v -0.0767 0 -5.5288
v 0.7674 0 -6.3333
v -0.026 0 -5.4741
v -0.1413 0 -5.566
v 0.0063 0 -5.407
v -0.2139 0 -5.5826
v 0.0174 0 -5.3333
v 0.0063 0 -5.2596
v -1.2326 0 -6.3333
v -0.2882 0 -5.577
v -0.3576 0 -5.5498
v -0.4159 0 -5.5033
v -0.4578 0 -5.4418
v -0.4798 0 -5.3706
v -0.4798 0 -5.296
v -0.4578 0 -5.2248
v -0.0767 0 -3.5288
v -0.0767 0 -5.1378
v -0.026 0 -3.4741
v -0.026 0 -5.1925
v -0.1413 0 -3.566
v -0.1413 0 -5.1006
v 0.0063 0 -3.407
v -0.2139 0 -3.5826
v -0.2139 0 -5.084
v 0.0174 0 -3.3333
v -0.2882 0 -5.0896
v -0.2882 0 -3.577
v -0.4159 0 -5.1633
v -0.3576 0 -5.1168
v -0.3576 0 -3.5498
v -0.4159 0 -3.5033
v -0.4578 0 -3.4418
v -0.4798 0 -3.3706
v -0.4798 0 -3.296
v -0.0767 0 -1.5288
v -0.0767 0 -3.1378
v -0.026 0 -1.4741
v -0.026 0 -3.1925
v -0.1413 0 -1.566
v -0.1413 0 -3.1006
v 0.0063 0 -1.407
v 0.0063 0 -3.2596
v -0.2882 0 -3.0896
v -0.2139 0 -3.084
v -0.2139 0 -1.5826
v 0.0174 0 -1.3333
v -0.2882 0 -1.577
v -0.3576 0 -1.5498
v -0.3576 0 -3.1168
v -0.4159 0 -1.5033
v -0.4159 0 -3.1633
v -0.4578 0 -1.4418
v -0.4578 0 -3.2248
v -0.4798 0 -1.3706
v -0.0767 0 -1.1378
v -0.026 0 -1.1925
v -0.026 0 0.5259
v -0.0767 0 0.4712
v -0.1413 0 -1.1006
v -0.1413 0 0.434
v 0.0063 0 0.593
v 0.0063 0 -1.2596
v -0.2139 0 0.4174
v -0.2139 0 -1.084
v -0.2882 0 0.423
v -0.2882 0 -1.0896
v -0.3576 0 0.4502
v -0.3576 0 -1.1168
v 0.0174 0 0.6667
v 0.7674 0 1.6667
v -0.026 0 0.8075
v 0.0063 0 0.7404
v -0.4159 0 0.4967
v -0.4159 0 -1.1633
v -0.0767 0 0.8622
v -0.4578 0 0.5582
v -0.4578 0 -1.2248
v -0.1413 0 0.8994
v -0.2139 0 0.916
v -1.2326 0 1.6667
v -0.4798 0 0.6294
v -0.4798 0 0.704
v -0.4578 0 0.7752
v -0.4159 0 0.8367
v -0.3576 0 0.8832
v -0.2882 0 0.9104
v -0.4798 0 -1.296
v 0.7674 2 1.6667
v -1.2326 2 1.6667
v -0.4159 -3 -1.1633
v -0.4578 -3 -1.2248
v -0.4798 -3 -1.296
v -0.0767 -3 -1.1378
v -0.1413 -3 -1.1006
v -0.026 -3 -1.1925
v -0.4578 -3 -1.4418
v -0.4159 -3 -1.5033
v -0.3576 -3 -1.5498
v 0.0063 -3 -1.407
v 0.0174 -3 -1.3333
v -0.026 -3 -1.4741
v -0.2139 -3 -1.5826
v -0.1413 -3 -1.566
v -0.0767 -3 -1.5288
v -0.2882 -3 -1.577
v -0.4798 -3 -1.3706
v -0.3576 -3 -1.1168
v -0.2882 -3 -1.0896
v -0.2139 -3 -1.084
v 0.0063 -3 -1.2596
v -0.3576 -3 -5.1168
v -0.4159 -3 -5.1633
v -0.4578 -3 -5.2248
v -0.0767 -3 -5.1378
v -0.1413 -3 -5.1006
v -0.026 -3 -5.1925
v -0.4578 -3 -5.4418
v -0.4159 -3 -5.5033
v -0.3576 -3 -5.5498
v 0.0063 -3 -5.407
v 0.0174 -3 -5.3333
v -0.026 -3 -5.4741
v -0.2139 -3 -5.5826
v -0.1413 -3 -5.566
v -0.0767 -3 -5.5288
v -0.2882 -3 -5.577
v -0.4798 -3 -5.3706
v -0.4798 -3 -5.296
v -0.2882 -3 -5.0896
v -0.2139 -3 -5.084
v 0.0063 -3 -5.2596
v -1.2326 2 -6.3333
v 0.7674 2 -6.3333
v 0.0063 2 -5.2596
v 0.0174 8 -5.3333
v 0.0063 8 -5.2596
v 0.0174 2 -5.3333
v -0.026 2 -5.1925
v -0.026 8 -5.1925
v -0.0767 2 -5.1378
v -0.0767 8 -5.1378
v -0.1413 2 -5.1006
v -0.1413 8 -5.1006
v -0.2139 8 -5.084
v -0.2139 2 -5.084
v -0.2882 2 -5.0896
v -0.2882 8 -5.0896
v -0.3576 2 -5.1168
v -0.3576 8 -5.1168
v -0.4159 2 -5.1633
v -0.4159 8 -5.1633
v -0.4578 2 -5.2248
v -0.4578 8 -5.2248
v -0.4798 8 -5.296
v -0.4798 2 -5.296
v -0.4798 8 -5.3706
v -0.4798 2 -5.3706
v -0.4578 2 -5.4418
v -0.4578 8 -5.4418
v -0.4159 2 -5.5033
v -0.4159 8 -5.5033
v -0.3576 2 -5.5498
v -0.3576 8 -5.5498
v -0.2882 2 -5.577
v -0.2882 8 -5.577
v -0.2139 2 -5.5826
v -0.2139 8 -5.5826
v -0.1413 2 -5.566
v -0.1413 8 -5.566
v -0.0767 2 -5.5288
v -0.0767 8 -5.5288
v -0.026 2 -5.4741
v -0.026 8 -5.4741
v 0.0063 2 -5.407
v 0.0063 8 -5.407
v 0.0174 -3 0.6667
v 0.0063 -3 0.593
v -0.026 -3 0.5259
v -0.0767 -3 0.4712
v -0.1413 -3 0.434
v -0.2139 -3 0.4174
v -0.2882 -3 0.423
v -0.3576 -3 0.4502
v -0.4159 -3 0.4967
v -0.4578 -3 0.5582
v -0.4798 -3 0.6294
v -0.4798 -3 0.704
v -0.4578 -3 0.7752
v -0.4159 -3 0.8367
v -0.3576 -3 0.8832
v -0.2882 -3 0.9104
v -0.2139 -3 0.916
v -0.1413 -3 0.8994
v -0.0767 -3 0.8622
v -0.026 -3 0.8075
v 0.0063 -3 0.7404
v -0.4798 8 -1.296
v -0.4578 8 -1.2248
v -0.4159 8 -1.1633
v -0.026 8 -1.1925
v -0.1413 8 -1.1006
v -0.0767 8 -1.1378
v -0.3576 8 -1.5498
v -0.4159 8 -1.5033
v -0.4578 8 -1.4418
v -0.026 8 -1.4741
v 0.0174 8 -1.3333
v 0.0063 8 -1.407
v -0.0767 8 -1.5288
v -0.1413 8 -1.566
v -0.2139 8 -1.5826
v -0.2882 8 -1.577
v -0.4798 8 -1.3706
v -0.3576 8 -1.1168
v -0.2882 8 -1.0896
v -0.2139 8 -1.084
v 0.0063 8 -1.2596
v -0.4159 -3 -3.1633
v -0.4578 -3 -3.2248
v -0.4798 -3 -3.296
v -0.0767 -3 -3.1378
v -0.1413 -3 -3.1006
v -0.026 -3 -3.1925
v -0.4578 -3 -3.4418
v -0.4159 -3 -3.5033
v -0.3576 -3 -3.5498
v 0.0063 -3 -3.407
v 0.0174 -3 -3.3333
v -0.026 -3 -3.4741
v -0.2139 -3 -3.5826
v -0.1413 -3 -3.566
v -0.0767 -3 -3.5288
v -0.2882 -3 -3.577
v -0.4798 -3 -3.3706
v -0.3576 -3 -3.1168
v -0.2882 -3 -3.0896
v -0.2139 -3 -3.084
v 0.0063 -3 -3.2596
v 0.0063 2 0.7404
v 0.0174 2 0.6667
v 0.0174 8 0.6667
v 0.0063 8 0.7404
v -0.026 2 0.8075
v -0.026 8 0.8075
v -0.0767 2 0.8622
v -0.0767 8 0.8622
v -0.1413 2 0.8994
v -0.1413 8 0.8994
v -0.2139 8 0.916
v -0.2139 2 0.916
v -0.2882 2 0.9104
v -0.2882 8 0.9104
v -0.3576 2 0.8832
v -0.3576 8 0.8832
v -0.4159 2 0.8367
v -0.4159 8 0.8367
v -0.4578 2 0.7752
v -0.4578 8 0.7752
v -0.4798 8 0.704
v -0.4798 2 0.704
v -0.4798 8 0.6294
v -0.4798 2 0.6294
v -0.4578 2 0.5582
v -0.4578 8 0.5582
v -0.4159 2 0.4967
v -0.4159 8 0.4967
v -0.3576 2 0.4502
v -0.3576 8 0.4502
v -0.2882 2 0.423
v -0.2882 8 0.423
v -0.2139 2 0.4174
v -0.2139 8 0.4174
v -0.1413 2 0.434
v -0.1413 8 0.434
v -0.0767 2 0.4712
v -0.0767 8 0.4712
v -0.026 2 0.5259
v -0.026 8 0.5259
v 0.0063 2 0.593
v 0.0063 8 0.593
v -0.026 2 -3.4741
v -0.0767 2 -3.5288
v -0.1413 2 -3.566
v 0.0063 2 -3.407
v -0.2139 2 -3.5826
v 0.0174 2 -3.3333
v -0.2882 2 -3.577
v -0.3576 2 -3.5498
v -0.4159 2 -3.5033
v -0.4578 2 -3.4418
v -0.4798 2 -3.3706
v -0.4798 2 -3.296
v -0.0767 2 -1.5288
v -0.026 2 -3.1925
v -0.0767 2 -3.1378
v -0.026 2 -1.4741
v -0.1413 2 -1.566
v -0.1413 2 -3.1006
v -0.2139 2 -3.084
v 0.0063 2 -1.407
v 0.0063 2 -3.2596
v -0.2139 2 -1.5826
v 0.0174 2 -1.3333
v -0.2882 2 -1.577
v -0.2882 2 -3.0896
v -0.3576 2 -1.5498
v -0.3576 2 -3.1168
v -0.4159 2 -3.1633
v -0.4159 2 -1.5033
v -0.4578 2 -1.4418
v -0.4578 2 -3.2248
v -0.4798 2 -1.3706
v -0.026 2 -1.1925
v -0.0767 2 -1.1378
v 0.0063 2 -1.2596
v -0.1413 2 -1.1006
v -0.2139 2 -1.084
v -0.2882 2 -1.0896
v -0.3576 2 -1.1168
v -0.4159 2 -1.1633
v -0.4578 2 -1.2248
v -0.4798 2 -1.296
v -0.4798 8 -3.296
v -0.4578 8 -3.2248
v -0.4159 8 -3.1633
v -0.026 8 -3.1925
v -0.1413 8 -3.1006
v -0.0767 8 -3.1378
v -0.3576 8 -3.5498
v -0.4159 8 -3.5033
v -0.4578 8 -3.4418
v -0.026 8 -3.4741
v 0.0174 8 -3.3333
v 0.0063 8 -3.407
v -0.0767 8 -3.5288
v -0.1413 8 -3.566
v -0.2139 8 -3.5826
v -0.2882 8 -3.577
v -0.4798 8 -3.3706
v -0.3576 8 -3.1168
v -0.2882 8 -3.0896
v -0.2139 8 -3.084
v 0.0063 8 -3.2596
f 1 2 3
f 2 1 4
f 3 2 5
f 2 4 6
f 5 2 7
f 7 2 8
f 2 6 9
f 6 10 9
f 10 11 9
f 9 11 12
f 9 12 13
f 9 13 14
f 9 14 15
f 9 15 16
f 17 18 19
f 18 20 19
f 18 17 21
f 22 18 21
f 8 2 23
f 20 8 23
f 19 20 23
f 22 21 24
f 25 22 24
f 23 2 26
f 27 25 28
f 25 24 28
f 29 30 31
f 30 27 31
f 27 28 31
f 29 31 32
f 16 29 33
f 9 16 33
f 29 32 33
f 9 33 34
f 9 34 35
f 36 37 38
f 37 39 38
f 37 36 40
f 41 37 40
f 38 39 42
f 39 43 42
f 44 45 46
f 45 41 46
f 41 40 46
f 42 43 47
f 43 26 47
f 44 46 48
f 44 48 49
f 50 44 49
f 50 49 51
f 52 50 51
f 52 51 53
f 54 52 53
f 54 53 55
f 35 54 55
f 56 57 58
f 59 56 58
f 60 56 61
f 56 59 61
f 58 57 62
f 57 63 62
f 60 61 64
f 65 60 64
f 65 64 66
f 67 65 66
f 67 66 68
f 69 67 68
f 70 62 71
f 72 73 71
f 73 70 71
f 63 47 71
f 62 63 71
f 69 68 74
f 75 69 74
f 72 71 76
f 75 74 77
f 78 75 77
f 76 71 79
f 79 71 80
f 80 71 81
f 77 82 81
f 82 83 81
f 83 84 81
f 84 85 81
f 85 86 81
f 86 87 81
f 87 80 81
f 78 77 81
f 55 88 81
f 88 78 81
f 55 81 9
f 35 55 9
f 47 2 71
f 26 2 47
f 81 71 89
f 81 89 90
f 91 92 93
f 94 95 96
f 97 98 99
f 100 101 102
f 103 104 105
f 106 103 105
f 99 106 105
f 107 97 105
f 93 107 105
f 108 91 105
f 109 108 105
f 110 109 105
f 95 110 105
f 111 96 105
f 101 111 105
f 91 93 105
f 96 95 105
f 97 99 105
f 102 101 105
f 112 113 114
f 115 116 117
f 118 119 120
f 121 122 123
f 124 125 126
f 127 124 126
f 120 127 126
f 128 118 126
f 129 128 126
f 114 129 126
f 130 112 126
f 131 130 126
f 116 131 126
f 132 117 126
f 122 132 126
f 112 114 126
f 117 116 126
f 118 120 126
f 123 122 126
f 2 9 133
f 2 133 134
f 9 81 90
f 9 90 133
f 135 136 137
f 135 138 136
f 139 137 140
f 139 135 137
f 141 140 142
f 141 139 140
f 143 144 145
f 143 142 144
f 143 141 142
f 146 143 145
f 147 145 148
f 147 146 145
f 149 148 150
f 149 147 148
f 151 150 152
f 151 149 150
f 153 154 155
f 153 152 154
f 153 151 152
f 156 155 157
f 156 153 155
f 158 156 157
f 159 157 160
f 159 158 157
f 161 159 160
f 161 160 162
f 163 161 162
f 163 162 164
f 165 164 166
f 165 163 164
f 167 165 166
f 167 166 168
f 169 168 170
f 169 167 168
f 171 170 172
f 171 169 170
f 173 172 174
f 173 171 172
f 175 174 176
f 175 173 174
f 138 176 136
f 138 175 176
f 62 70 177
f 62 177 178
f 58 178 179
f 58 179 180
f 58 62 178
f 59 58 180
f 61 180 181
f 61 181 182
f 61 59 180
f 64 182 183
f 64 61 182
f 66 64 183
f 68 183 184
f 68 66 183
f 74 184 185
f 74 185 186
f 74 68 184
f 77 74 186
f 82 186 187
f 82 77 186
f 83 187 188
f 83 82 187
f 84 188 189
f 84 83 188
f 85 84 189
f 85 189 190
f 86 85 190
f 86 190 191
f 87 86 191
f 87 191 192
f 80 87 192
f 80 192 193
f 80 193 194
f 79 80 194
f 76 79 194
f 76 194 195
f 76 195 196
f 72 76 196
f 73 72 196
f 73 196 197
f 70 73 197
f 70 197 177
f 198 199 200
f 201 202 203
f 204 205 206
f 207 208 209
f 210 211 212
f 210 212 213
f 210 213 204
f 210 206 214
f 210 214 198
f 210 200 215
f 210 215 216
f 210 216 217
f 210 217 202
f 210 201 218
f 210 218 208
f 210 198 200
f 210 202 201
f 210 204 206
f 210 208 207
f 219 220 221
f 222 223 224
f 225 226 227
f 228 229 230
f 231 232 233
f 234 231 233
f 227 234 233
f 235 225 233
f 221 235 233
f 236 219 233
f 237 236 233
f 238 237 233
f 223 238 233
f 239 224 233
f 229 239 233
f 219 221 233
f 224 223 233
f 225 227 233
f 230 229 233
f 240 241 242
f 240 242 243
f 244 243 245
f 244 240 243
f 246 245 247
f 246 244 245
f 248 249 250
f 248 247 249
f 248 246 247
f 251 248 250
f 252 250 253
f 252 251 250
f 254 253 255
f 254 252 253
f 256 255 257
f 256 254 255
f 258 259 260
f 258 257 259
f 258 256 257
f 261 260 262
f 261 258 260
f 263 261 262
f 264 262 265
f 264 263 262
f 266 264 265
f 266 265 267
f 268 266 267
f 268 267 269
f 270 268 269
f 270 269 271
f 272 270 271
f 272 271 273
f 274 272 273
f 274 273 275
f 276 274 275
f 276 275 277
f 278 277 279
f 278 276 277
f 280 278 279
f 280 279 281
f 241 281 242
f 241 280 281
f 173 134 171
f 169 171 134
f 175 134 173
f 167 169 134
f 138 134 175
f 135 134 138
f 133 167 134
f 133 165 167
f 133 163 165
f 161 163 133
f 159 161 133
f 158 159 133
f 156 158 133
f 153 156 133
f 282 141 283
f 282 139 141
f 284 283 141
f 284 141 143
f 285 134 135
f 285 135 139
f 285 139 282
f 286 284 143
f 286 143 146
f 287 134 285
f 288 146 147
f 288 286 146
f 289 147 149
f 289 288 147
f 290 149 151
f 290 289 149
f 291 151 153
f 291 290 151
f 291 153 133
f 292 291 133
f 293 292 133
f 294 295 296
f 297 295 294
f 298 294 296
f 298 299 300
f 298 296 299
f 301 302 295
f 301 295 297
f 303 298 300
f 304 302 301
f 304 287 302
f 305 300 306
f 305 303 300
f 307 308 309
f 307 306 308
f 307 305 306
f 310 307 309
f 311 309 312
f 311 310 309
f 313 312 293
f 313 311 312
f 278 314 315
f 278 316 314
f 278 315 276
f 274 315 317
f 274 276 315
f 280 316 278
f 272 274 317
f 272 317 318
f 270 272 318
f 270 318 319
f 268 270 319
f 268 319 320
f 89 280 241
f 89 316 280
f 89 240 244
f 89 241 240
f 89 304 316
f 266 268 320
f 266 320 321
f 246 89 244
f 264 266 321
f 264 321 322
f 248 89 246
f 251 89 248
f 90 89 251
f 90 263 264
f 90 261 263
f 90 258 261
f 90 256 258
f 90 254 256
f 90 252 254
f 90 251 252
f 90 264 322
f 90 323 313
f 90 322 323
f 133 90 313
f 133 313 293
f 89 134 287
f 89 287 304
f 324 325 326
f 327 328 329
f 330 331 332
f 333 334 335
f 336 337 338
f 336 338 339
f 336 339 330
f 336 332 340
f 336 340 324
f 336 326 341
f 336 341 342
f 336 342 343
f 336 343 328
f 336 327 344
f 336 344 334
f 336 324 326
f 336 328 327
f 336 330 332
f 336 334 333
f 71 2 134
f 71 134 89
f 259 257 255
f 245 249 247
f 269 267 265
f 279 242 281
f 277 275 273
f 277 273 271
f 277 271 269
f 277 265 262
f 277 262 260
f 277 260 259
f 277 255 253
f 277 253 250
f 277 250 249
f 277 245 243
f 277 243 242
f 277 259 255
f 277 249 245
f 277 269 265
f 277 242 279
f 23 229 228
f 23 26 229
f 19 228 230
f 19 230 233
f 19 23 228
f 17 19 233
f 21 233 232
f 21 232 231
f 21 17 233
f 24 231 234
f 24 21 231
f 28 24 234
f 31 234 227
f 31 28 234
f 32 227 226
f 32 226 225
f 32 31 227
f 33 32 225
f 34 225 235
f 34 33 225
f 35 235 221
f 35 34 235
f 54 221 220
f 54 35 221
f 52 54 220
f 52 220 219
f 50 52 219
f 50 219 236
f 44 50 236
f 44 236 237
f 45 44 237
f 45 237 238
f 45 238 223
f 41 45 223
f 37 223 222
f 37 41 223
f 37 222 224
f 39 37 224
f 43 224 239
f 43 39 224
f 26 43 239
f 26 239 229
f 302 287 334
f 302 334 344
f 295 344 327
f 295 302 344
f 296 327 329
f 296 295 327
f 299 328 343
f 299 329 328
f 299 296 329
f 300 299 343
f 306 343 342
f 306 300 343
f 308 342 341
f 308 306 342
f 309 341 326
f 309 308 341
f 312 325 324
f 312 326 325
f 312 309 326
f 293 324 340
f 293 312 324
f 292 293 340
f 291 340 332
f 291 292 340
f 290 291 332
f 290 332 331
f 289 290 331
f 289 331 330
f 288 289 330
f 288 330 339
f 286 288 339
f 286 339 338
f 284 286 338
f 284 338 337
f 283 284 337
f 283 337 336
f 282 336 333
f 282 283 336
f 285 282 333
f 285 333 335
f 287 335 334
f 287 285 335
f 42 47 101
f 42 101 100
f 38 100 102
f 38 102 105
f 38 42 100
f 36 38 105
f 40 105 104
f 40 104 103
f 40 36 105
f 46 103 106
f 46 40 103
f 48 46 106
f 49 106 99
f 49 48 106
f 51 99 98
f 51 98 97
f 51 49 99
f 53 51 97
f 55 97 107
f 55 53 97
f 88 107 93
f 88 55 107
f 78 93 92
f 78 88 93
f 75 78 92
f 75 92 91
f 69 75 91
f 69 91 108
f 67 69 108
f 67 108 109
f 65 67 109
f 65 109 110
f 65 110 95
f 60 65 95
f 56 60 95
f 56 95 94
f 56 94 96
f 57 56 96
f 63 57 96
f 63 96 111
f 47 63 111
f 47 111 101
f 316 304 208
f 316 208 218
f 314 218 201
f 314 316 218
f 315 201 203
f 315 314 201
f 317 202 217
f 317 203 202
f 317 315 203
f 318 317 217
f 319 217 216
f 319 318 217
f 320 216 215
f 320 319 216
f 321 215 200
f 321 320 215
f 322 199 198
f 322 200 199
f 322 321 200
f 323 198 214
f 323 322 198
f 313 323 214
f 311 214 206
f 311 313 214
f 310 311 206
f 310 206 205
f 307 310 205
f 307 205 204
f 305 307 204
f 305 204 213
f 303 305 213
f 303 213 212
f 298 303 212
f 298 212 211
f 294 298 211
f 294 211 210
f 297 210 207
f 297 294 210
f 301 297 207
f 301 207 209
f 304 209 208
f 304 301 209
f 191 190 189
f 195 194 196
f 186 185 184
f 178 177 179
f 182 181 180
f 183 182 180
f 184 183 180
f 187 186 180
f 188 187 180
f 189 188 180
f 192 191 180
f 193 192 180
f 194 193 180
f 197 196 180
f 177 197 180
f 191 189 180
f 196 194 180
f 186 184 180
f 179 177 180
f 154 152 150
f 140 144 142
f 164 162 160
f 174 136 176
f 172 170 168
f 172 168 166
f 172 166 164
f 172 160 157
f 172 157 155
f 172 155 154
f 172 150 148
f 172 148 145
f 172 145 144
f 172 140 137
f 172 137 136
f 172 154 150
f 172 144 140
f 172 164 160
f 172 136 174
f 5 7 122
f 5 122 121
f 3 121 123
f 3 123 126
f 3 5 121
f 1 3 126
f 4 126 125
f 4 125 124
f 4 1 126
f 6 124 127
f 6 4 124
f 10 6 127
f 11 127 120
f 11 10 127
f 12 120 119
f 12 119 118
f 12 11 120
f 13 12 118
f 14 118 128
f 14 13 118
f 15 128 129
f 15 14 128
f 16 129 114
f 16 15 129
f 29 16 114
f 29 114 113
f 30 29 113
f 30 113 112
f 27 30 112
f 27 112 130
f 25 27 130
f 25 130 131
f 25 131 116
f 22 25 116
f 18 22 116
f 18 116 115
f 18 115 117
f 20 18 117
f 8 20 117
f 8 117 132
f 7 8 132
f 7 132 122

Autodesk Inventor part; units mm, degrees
ref_plane "YZ Plane" through (0, 0, 0) normal (1, 0, 0) x (0, 1, 0)
ref_plane "XZ Plane" through (0, 0, 0) normal (0, 1, 0) x (-1, 0, 0)
ref_plane "XY Plane" through (0, 0, 0) normal (0, 0, 1) x (1, 0, 0)
sketch "Sketch1" plane through (0, 0, 0) normal (0, 1, 0) x (-1, 0, 0)
  line L0 (-0.7674, 1.6667) -> (1.2326, 1.6667)
  line L1 (1.2326, 1.6667) -> (1.2326, -6.3333)
  line L2 (1.2326, -6.3333) -> (-0.7674, -6.3333)
  line L3 (-0.7674, -6.3333) -> (-0.7674, 1.6667)
  point P0 (0, 0)
  dimension "d0" = 2
  dimension "d1" = 8
extrude "Extrusion1" add sketch "Sketch1" along normal blind 2
sketch "Sketch2" plane through (0, 2, 0) normal (0, 1, 0) x (1, 0, 0)
  line L0 (0.7674, 6.3333) -> (-1.2326, 6.3333) projected
  circle A0 centre (-0.2326, 5.3333) radius 0.25
  point P0 (0, 0)
  dimension "d4" = 1
  dimension "d5" = 0.5
extrude "Extrusion2" add sketch "Sketch2" along normal blind 6 and the other way blind 5
pattern_linear "Rectangular Pattern1" count 4 spacing 2 along (0, 0, 1) of "Extrusion2"
properties part number "2mm4PosHeader"
